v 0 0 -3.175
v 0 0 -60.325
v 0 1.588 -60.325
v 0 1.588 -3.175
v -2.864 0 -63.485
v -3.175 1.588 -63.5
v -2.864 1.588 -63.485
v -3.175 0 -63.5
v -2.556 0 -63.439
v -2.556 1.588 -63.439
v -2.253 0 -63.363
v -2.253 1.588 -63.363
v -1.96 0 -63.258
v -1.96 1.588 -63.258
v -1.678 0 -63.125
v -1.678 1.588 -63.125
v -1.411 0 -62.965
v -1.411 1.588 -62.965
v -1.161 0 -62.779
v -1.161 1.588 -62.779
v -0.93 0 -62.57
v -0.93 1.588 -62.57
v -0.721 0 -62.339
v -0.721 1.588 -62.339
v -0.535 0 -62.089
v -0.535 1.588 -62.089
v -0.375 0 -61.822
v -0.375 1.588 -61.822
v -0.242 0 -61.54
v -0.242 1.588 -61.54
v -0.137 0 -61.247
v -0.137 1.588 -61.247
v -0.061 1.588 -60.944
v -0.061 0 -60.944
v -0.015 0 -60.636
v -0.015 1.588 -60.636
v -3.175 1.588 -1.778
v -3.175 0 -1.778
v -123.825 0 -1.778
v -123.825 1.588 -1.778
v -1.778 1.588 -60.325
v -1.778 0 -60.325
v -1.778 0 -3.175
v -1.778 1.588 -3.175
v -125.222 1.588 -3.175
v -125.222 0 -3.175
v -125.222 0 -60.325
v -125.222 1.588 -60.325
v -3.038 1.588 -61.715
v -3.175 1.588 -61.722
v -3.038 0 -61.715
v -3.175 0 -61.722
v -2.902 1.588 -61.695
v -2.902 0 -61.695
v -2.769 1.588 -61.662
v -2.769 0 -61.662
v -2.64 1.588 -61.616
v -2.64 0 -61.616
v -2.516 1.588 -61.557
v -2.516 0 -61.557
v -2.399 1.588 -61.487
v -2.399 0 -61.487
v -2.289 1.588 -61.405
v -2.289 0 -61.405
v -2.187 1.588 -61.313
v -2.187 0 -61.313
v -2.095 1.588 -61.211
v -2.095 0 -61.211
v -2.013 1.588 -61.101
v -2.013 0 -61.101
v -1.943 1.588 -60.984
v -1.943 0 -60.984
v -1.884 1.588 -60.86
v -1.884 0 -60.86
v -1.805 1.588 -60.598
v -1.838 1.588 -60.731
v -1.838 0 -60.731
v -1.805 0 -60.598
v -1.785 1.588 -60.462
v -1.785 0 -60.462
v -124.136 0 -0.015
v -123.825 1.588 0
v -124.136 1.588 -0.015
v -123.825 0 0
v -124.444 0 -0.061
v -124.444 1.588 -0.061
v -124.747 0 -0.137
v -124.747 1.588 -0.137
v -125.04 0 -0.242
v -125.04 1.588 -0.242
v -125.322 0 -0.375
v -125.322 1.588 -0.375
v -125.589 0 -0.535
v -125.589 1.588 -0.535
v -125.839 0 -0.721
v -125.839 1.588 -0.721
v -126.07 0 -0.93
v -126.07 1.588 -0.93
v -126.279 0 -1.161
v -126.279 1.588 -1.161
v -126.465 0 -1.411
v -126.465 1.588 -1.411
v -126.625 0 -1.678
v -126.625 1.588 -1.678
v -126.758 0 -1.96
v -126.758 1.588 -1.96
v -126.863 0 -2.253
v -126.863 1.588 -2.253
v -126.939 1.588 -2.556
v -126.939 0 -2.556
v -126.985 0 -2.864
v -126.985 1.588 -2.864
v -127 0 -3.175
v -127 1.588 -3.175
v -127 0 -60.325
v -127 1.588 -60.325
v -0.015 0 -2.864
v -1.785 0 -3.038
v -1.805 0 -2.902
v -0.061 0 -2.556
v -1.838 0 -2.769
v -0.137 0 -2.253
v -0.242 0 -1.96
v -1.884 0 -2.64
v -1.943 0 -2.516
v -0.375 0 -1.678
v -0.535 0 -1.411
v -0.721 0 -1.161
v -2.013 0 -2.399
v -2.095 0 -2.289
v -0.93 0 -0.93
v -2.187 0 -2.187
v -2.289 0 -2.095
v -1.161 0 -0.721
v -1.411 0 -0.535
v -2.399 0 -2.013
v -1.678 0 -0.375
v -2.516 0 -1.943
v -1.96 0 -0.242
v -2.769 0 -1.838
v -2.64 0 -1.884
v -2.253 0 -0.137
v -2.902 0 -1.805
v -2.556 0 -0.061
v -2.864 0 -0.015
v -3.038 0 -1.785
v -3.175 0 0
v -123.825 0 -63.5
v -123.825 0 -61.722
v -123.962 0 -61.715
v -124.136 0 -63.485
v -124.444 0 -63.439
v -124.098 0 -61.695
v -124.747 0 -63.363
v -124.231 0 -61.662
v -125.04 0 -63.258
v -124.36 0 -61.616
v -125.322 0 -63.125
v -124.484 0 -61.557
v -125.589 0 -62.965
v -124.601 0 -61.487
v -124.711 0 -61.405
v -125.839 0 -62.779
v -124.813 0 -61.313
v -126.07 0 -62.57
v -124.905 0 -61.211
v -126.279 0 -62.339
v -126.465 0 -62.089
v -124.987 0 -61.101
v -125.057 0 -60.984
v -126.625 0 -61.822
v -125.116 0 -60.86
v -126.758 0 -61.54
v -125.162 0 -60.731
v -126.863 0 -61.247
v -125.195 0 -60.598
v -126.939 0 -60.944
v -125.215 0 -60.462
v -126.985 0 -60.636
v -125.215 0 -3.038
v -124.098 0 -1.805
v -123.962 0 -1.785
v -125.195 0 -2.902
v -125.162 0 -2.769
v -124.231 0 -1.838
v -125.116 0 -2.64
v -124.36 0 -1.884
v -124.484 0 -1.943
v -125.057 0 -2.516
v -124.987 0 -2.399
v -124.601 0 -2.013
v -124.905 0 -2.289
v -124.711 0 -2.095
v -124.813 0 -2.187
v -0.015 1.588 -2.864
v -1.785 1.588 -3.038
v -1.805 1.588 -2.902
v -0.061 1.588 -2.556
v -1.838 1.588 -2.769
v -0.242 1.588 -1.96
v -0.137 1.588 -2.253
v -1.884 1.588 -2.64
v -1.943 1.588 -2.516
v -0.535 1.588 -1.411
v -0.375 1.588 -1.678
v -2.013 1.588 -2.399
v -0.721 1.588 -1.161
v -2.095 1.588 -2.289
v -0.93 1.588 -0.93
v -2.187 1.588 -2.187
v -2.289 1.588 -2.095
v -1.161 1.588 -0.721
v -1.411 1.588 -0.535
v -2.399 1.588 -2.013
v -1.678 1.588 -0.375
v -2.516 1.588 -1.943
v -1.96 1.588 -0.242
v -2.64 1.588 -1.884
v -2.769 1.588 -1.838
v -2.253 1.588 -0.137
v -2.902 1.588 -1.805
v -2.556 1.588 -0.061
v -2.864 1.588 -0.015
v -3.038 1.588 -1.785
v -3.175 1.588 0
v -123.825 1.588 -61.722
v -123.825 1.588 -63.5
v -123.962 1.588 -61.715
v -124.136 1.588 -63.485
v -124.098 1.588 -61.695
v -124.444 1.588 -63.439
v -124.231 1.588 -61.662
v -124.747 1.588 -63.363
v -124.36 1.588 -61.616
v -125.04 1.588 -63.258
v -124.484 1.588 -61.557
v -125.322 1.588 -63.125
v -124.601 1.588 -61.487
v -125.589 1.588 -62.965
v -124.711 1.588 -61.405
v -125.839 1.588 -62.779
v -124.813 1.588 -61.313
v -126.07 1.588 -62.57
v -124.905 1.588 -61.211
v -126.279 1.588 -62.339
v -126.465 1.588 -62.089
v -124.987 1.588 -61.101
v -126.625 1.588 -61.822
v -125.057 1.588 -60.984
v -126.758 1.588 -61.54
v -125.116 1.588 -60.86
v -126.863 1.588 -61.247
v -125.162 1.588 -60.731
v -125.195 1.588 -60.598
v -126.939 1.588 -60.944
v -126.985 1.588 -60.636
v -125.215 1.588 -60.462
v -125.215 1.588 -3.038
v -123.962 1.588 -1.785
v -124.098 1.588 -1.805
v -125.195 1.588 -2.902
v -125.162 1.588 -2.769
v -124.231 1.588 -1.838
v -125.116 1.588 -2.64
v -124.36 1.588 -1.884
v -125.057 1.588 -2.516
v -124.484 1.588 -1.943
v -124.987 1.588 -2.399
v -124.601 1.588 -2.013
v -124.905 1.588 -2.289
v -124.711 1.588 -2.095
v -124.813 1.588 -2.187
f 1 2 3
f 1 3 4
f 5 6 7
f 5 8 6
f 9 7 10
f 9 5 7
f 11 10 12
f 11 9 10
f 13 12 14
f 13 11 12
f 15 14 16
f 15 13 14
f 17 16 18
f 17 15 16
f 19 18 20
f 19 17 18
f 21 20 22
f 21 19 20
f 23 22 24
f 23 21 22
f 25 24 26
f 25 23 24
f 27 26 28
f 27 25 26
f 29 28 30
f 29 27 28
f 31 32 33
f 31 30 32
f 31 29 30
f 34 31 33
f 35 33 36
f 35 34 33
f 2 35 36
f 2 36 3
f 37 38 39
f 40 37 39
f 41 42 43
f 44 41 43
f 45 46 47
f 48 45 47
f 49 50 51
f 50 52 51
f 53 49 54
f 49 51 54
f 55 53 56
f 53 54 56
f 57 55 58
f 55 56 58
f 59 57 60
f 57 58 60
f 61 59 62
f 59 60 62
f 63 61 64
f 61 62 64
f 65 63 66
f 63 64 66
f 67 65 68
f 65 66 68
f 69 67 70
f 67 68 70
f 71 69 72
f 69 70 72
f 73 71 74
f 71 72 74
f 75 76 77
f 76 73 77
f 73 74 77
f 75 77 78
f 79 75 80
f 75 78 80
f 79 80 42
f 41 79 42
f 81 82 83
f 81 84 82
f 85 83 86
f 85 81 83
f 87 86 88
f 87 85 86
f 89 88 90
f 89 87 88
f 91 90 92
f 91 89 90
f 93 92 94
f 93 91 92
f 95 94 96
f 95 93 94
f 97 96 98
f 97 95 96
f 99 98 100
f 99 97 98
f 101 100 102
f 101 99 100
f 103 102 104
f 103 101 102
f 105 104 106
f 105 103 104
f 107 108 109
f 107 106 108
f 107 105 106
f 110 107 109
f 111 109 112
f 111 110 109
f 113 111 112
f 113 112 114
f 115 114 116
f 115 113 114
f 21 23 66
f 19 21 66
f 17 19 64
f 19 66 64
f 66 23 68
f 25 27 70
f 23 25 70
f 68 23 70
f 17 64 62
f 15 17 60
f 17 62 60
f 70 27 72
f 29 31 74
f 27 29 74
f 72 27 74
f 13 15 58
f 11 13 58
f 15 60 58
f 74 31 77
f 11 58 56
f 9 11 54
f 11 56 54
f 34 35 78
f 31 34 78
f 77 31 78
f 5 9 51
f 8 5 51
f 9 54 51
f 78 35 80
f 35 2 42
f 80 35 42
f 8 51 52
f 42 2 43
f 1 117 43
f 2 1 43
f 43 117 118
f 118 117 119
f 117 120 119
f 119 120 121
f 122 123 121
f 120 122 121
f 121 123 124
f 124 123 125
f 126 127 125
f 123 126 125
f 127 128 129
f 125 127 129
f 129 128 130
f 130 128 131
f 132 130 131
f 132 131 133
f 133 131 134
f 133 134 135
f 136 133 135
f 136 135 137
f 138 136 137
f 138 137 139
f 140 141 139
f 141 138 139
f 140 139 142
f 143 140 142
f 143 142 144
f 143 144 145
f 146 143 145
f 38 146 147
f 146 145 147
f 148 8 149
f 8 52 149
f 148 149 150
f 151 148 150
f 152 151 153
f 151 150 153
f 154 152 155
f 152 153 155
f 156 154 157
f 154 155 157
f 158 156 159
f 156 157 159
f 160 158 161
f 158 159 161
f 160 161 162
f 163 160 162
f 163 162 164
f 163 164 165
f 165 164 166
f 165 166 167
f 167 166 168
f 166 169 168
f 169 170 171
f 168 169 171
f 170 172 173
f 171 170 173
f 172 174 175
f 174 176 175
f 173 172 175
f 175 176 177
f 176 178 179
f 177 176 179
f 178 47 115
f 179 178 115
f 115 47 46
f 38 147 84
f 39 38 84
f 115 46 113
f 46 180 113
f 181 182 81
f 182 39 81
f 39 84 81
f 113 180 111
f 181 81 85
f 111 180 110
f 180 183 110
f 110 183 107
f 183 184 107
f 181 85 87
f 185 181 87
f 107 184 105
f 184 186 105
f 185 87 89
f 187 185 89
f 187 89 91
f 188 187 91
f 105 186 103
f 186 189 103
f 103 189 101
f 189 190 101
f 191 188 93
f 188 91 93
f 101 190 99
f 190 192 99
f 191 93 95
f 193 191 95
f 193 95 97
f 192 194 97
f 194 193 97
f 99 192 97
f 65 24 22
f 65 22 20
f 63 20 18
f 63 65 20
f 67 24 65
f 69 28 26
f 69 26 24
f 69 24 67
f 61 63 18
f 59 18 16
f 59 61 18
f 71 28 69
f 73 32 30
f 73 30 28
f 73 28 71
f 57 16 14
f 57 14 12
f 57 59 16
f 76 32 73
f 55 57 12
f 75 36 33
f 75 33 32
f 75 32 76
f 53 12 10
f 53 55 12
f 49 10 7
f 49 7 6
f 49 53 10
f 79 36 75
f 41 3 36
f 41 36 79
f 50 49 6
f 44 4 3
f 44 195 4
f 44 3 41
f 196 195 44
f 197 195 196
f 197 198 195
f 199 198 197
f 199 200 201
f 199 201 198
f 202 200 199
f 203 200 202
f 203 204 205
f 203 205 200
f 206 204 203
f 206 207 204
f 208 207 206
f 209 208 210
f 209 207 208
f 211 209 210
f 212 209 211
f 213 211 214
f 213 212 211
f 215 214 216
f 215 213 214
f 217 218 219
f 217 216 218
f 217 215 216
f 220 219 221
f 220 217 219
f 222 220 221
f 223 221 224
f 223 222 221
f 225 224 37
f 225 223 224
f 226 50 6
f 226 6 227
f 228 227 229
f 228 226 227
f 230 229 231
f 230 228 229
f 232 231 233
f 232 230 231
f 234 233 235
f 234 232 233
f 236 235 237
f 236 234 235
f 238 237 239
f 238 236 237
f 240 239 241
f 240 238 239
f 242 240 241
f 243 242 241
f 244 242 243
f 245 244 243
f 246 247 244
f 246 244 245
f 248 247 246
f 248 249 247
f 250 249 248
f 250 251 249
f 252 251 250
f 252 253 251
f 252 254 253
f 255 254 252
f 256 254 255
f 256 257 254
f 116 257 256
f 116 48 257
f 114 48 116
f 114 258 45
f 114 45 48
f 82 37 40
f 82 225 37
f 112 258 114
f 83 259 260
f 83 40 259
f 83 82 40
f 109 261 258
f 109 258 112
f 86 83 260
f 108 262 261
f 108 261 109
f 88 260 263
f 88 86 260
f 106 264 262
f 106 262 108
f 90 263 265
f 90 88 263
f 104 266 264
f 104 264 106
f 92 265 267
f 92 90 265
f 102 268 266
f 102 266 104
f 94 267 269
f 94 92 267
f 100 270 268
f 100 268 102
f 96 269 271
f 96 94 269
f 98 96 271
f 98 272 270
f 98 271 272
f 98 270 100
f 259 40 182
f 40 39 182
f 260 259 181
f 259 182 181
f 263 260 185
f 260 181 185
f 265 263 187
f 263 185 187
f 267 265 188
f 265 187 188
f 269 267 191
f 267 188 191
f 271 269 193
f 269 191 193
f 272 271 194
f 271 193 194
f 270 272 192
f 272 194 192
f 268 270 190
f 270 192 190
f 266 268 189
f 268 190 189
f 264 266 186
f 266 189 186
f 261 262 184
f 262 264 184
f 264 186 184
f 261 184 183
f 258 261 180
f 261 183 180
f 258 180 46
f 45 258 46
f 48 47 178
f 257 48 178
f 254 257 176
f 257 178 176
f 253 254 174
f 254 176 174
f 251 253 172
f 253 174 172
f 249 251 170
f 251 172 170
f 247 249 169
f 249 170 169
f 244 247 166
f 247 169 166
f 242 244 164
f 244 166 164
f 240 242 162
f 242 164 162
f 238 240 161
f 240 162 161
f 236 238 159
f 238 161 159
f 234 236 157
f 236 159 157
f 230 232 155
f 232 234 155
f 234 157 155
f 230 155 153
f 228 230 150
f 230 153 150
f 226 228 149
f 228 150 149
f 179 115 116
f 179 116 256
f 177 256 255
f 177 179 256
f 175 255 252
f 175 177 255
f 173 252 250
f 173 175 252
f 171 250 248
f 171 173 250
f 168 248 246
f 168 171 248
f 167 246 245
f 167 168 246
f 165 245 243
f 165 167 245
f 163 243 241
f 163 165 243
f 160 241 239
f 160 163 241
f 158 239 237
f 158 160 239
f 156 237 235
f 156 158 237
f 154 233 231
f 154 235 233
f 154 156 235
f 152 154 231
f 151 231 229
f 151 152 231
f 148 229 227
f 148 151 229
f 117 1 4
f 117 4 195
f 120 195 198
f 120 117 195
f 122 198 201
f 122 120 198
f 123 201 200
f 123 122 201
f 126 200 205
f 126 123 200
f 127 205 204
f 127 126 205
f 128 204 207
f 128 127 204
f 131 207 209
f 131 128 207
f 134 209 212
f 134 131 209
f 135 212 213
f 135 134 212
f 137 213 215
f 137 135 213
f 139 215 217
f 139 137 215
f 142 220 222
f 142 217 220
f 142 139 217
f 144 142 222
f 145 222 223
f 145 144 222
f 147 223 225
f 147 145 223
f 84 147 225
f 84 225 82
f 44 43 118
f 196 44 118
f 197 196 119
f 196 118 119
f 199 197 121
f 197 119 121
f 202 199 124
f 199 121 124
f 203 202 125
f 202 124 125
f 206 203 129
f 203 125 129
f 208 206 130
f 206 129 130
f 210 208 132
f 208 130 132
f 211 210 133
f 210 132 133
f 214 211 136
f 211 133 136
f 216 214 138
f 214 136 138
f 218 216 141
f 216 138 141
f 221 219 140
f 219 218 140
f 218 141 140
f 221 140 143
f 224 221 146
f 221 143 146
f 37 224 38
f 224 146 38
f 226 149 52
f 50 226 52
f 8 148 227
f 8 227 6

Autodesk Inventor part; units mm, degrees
ref_plane "YZ Plane" through (0, 0, 0) normal (1, 0, 0) x (0, 1, 0)
ref_plane "XZ Plane" through (0, 0, 0) normal (0, 1, 0) x (-1, 0, 0)
ref_plane "XY Plane" through (0, 0, 0) normal (0, 0, 1) x (1, 0, 0)
sketch "Sketch1" plane through (0, 0, 0) normal (0, 1, 0) x (-1, 0, 0)
  line L0 (3.175, 0) -> (123.825, 0)
  line L1 (127, -3.175) -> (127, -60.325)
  line L2 (123.825, -63.5) -> (3.175, -63.5)
  line L3 (0, -60.325) -> (0, -3.175)
  arc A0 (127, -3.175) -> (123.825, 0) centre (123.825, -3.175) ccw
  arc A1 (123.825, -63.5) -> (127, -60.325) centre (123.825, -60.325) ccw
  arc A2 (0, -60.325) -> (3.175, -63.5) centre (3.175, -60.325) ccw
  arc A3 (3.175, 0) -> (0, -3.175) centre (3.175, -3.175) ccw
  line L4 (1.905, -3.175) -> (1.905, -60.325)
  arc A4 (1.905, -60.325) -> (3.175, -61.595) centre (3.175, -60.325) ccw
  line L5 (3.175, -61.595) -> (123.825, -61.595)
  arc A5 (123.825, -61.595) -> (125.095, -60.325) centre (123.825, -60.325) ccw
  line L6 (125.095, -60.325) -> (125.095, -3.175)
  arc A6 (125.095, -3.175) -> (123.825, -1.905) centre (123.825, -3.175) ccw
  line L7 (123.825, -1.905) -> (3.175, -1.905)
  arc A7 (3.175, -1.905) -> (1.905, -3.175) centre (3.175, -3.175) ccw
  line L8 (3.175, -1.778) -> (123.825, -1.778)
  arc A8 (125.222, -3.175) -> (123.825, -1.778) centre (123.825, -3.175) ccw
  line L9 (125.222, -3.175) -> (125.222, -60.325)
  arc A9 (123.825, -61.722) -> (125.222, -60.325) centre (123.825, -60.325) ccw
  line L10 (123.825, -61.722) -> (3.175, -61.722)
  arc A10 (1.778, -60.325) -> (3.175, -61.722) centre (3.175, -60.325) ccw
  line L11 (1.778, -60.325) -> (1.778, -3.175)
  arc A11 (3.175, -1.778) -> (1.778, -3.175) centre (3.175, -3.175) ccw
  point P0 (0, 0)
  point P1 (127, -63.5)
  point P2 (127, 0)
  point P3 (0, -63.5)
  point P4 (3.175, -3.175)
  point P5 (123.825, -3.175)
  point P6 (123.825, -60.325)
  point P7 (3.175, -60.325)
  dimension "d0" = 63.5
  dimension "d1" = 127
  dimension "d2" = 3.175
  dimension "d3" = 3.175
  dimension "d7" = 1.905
  dimension "d12" = 0.127
extrude "Extrusion1" add sketch "Sketch1" along normal blind 1.5875 contours L0 A0 L1 A1 L2 A2 L3 A3
equation "\"d3\" = d2"
properties part number "PinecilCaseBorder" material "ABS Plastic"
